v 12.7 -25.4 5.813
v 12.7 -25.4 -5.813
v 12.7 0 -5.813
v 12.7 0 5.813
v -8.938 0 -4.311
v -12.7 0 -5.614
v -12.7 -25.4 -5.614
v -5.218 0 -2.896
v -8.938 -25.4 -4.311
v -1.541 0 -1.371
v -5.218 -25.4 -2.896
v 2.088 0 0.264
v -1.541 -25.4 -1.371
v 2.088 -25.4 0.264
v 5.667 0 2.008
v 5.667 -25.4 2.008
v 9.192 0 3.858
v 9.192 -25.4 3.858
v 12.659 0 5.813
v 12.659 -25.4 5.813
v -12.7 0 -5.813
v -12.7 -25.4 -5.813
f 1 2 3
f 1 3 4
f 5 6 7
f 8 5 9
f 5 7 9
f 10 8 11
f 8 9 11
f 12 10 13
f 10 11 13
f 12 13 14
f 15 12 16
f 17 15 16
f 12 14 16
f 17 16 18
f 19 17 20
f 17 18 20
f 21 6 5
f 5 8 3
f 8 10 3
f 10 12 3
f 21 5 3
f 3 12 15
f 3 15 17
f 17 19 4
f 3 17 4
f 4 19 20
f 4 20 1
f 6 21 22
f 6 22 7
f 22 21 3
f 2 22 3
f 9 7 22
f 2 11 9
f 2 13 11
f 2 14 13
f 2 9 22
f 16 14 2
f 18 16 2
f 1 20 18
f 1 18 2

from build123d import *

# Parameters (mm, degrees)
F0_W     = 25.4
F0_H     = 11.6255704415
F1_DEPTH = 25.4
F3_DEPTH = 25.401


with BuildPart() as f1:
    # F0 (on Front) → F1 (new body)
    with BuildSketch(Plane.XZ):
        Rectangle(F0_W, F0_H)
    extrude(amount=F1_DEPTH)

    # F2 (on face) → F3 (cut, through all)
    with BuildSketch(Plane.XZ.offset(25.4)):
        with BuildLine():
            Line((-12.7, 5.8127852207), (-12.7, -5.613514744))
            ThreePointArc((-12.7, -5.613514744), (0.2798565548, -0.5667526673), (12.6591933696, 5.8127852207))
            Line((12.6591933696, 5.8127852207), (-12.7, 5.8127852207))
        make_face()
    extrude(amount=-F3_DEPTH, mode=Mode.SUBTRACT)


solid = f1.part
